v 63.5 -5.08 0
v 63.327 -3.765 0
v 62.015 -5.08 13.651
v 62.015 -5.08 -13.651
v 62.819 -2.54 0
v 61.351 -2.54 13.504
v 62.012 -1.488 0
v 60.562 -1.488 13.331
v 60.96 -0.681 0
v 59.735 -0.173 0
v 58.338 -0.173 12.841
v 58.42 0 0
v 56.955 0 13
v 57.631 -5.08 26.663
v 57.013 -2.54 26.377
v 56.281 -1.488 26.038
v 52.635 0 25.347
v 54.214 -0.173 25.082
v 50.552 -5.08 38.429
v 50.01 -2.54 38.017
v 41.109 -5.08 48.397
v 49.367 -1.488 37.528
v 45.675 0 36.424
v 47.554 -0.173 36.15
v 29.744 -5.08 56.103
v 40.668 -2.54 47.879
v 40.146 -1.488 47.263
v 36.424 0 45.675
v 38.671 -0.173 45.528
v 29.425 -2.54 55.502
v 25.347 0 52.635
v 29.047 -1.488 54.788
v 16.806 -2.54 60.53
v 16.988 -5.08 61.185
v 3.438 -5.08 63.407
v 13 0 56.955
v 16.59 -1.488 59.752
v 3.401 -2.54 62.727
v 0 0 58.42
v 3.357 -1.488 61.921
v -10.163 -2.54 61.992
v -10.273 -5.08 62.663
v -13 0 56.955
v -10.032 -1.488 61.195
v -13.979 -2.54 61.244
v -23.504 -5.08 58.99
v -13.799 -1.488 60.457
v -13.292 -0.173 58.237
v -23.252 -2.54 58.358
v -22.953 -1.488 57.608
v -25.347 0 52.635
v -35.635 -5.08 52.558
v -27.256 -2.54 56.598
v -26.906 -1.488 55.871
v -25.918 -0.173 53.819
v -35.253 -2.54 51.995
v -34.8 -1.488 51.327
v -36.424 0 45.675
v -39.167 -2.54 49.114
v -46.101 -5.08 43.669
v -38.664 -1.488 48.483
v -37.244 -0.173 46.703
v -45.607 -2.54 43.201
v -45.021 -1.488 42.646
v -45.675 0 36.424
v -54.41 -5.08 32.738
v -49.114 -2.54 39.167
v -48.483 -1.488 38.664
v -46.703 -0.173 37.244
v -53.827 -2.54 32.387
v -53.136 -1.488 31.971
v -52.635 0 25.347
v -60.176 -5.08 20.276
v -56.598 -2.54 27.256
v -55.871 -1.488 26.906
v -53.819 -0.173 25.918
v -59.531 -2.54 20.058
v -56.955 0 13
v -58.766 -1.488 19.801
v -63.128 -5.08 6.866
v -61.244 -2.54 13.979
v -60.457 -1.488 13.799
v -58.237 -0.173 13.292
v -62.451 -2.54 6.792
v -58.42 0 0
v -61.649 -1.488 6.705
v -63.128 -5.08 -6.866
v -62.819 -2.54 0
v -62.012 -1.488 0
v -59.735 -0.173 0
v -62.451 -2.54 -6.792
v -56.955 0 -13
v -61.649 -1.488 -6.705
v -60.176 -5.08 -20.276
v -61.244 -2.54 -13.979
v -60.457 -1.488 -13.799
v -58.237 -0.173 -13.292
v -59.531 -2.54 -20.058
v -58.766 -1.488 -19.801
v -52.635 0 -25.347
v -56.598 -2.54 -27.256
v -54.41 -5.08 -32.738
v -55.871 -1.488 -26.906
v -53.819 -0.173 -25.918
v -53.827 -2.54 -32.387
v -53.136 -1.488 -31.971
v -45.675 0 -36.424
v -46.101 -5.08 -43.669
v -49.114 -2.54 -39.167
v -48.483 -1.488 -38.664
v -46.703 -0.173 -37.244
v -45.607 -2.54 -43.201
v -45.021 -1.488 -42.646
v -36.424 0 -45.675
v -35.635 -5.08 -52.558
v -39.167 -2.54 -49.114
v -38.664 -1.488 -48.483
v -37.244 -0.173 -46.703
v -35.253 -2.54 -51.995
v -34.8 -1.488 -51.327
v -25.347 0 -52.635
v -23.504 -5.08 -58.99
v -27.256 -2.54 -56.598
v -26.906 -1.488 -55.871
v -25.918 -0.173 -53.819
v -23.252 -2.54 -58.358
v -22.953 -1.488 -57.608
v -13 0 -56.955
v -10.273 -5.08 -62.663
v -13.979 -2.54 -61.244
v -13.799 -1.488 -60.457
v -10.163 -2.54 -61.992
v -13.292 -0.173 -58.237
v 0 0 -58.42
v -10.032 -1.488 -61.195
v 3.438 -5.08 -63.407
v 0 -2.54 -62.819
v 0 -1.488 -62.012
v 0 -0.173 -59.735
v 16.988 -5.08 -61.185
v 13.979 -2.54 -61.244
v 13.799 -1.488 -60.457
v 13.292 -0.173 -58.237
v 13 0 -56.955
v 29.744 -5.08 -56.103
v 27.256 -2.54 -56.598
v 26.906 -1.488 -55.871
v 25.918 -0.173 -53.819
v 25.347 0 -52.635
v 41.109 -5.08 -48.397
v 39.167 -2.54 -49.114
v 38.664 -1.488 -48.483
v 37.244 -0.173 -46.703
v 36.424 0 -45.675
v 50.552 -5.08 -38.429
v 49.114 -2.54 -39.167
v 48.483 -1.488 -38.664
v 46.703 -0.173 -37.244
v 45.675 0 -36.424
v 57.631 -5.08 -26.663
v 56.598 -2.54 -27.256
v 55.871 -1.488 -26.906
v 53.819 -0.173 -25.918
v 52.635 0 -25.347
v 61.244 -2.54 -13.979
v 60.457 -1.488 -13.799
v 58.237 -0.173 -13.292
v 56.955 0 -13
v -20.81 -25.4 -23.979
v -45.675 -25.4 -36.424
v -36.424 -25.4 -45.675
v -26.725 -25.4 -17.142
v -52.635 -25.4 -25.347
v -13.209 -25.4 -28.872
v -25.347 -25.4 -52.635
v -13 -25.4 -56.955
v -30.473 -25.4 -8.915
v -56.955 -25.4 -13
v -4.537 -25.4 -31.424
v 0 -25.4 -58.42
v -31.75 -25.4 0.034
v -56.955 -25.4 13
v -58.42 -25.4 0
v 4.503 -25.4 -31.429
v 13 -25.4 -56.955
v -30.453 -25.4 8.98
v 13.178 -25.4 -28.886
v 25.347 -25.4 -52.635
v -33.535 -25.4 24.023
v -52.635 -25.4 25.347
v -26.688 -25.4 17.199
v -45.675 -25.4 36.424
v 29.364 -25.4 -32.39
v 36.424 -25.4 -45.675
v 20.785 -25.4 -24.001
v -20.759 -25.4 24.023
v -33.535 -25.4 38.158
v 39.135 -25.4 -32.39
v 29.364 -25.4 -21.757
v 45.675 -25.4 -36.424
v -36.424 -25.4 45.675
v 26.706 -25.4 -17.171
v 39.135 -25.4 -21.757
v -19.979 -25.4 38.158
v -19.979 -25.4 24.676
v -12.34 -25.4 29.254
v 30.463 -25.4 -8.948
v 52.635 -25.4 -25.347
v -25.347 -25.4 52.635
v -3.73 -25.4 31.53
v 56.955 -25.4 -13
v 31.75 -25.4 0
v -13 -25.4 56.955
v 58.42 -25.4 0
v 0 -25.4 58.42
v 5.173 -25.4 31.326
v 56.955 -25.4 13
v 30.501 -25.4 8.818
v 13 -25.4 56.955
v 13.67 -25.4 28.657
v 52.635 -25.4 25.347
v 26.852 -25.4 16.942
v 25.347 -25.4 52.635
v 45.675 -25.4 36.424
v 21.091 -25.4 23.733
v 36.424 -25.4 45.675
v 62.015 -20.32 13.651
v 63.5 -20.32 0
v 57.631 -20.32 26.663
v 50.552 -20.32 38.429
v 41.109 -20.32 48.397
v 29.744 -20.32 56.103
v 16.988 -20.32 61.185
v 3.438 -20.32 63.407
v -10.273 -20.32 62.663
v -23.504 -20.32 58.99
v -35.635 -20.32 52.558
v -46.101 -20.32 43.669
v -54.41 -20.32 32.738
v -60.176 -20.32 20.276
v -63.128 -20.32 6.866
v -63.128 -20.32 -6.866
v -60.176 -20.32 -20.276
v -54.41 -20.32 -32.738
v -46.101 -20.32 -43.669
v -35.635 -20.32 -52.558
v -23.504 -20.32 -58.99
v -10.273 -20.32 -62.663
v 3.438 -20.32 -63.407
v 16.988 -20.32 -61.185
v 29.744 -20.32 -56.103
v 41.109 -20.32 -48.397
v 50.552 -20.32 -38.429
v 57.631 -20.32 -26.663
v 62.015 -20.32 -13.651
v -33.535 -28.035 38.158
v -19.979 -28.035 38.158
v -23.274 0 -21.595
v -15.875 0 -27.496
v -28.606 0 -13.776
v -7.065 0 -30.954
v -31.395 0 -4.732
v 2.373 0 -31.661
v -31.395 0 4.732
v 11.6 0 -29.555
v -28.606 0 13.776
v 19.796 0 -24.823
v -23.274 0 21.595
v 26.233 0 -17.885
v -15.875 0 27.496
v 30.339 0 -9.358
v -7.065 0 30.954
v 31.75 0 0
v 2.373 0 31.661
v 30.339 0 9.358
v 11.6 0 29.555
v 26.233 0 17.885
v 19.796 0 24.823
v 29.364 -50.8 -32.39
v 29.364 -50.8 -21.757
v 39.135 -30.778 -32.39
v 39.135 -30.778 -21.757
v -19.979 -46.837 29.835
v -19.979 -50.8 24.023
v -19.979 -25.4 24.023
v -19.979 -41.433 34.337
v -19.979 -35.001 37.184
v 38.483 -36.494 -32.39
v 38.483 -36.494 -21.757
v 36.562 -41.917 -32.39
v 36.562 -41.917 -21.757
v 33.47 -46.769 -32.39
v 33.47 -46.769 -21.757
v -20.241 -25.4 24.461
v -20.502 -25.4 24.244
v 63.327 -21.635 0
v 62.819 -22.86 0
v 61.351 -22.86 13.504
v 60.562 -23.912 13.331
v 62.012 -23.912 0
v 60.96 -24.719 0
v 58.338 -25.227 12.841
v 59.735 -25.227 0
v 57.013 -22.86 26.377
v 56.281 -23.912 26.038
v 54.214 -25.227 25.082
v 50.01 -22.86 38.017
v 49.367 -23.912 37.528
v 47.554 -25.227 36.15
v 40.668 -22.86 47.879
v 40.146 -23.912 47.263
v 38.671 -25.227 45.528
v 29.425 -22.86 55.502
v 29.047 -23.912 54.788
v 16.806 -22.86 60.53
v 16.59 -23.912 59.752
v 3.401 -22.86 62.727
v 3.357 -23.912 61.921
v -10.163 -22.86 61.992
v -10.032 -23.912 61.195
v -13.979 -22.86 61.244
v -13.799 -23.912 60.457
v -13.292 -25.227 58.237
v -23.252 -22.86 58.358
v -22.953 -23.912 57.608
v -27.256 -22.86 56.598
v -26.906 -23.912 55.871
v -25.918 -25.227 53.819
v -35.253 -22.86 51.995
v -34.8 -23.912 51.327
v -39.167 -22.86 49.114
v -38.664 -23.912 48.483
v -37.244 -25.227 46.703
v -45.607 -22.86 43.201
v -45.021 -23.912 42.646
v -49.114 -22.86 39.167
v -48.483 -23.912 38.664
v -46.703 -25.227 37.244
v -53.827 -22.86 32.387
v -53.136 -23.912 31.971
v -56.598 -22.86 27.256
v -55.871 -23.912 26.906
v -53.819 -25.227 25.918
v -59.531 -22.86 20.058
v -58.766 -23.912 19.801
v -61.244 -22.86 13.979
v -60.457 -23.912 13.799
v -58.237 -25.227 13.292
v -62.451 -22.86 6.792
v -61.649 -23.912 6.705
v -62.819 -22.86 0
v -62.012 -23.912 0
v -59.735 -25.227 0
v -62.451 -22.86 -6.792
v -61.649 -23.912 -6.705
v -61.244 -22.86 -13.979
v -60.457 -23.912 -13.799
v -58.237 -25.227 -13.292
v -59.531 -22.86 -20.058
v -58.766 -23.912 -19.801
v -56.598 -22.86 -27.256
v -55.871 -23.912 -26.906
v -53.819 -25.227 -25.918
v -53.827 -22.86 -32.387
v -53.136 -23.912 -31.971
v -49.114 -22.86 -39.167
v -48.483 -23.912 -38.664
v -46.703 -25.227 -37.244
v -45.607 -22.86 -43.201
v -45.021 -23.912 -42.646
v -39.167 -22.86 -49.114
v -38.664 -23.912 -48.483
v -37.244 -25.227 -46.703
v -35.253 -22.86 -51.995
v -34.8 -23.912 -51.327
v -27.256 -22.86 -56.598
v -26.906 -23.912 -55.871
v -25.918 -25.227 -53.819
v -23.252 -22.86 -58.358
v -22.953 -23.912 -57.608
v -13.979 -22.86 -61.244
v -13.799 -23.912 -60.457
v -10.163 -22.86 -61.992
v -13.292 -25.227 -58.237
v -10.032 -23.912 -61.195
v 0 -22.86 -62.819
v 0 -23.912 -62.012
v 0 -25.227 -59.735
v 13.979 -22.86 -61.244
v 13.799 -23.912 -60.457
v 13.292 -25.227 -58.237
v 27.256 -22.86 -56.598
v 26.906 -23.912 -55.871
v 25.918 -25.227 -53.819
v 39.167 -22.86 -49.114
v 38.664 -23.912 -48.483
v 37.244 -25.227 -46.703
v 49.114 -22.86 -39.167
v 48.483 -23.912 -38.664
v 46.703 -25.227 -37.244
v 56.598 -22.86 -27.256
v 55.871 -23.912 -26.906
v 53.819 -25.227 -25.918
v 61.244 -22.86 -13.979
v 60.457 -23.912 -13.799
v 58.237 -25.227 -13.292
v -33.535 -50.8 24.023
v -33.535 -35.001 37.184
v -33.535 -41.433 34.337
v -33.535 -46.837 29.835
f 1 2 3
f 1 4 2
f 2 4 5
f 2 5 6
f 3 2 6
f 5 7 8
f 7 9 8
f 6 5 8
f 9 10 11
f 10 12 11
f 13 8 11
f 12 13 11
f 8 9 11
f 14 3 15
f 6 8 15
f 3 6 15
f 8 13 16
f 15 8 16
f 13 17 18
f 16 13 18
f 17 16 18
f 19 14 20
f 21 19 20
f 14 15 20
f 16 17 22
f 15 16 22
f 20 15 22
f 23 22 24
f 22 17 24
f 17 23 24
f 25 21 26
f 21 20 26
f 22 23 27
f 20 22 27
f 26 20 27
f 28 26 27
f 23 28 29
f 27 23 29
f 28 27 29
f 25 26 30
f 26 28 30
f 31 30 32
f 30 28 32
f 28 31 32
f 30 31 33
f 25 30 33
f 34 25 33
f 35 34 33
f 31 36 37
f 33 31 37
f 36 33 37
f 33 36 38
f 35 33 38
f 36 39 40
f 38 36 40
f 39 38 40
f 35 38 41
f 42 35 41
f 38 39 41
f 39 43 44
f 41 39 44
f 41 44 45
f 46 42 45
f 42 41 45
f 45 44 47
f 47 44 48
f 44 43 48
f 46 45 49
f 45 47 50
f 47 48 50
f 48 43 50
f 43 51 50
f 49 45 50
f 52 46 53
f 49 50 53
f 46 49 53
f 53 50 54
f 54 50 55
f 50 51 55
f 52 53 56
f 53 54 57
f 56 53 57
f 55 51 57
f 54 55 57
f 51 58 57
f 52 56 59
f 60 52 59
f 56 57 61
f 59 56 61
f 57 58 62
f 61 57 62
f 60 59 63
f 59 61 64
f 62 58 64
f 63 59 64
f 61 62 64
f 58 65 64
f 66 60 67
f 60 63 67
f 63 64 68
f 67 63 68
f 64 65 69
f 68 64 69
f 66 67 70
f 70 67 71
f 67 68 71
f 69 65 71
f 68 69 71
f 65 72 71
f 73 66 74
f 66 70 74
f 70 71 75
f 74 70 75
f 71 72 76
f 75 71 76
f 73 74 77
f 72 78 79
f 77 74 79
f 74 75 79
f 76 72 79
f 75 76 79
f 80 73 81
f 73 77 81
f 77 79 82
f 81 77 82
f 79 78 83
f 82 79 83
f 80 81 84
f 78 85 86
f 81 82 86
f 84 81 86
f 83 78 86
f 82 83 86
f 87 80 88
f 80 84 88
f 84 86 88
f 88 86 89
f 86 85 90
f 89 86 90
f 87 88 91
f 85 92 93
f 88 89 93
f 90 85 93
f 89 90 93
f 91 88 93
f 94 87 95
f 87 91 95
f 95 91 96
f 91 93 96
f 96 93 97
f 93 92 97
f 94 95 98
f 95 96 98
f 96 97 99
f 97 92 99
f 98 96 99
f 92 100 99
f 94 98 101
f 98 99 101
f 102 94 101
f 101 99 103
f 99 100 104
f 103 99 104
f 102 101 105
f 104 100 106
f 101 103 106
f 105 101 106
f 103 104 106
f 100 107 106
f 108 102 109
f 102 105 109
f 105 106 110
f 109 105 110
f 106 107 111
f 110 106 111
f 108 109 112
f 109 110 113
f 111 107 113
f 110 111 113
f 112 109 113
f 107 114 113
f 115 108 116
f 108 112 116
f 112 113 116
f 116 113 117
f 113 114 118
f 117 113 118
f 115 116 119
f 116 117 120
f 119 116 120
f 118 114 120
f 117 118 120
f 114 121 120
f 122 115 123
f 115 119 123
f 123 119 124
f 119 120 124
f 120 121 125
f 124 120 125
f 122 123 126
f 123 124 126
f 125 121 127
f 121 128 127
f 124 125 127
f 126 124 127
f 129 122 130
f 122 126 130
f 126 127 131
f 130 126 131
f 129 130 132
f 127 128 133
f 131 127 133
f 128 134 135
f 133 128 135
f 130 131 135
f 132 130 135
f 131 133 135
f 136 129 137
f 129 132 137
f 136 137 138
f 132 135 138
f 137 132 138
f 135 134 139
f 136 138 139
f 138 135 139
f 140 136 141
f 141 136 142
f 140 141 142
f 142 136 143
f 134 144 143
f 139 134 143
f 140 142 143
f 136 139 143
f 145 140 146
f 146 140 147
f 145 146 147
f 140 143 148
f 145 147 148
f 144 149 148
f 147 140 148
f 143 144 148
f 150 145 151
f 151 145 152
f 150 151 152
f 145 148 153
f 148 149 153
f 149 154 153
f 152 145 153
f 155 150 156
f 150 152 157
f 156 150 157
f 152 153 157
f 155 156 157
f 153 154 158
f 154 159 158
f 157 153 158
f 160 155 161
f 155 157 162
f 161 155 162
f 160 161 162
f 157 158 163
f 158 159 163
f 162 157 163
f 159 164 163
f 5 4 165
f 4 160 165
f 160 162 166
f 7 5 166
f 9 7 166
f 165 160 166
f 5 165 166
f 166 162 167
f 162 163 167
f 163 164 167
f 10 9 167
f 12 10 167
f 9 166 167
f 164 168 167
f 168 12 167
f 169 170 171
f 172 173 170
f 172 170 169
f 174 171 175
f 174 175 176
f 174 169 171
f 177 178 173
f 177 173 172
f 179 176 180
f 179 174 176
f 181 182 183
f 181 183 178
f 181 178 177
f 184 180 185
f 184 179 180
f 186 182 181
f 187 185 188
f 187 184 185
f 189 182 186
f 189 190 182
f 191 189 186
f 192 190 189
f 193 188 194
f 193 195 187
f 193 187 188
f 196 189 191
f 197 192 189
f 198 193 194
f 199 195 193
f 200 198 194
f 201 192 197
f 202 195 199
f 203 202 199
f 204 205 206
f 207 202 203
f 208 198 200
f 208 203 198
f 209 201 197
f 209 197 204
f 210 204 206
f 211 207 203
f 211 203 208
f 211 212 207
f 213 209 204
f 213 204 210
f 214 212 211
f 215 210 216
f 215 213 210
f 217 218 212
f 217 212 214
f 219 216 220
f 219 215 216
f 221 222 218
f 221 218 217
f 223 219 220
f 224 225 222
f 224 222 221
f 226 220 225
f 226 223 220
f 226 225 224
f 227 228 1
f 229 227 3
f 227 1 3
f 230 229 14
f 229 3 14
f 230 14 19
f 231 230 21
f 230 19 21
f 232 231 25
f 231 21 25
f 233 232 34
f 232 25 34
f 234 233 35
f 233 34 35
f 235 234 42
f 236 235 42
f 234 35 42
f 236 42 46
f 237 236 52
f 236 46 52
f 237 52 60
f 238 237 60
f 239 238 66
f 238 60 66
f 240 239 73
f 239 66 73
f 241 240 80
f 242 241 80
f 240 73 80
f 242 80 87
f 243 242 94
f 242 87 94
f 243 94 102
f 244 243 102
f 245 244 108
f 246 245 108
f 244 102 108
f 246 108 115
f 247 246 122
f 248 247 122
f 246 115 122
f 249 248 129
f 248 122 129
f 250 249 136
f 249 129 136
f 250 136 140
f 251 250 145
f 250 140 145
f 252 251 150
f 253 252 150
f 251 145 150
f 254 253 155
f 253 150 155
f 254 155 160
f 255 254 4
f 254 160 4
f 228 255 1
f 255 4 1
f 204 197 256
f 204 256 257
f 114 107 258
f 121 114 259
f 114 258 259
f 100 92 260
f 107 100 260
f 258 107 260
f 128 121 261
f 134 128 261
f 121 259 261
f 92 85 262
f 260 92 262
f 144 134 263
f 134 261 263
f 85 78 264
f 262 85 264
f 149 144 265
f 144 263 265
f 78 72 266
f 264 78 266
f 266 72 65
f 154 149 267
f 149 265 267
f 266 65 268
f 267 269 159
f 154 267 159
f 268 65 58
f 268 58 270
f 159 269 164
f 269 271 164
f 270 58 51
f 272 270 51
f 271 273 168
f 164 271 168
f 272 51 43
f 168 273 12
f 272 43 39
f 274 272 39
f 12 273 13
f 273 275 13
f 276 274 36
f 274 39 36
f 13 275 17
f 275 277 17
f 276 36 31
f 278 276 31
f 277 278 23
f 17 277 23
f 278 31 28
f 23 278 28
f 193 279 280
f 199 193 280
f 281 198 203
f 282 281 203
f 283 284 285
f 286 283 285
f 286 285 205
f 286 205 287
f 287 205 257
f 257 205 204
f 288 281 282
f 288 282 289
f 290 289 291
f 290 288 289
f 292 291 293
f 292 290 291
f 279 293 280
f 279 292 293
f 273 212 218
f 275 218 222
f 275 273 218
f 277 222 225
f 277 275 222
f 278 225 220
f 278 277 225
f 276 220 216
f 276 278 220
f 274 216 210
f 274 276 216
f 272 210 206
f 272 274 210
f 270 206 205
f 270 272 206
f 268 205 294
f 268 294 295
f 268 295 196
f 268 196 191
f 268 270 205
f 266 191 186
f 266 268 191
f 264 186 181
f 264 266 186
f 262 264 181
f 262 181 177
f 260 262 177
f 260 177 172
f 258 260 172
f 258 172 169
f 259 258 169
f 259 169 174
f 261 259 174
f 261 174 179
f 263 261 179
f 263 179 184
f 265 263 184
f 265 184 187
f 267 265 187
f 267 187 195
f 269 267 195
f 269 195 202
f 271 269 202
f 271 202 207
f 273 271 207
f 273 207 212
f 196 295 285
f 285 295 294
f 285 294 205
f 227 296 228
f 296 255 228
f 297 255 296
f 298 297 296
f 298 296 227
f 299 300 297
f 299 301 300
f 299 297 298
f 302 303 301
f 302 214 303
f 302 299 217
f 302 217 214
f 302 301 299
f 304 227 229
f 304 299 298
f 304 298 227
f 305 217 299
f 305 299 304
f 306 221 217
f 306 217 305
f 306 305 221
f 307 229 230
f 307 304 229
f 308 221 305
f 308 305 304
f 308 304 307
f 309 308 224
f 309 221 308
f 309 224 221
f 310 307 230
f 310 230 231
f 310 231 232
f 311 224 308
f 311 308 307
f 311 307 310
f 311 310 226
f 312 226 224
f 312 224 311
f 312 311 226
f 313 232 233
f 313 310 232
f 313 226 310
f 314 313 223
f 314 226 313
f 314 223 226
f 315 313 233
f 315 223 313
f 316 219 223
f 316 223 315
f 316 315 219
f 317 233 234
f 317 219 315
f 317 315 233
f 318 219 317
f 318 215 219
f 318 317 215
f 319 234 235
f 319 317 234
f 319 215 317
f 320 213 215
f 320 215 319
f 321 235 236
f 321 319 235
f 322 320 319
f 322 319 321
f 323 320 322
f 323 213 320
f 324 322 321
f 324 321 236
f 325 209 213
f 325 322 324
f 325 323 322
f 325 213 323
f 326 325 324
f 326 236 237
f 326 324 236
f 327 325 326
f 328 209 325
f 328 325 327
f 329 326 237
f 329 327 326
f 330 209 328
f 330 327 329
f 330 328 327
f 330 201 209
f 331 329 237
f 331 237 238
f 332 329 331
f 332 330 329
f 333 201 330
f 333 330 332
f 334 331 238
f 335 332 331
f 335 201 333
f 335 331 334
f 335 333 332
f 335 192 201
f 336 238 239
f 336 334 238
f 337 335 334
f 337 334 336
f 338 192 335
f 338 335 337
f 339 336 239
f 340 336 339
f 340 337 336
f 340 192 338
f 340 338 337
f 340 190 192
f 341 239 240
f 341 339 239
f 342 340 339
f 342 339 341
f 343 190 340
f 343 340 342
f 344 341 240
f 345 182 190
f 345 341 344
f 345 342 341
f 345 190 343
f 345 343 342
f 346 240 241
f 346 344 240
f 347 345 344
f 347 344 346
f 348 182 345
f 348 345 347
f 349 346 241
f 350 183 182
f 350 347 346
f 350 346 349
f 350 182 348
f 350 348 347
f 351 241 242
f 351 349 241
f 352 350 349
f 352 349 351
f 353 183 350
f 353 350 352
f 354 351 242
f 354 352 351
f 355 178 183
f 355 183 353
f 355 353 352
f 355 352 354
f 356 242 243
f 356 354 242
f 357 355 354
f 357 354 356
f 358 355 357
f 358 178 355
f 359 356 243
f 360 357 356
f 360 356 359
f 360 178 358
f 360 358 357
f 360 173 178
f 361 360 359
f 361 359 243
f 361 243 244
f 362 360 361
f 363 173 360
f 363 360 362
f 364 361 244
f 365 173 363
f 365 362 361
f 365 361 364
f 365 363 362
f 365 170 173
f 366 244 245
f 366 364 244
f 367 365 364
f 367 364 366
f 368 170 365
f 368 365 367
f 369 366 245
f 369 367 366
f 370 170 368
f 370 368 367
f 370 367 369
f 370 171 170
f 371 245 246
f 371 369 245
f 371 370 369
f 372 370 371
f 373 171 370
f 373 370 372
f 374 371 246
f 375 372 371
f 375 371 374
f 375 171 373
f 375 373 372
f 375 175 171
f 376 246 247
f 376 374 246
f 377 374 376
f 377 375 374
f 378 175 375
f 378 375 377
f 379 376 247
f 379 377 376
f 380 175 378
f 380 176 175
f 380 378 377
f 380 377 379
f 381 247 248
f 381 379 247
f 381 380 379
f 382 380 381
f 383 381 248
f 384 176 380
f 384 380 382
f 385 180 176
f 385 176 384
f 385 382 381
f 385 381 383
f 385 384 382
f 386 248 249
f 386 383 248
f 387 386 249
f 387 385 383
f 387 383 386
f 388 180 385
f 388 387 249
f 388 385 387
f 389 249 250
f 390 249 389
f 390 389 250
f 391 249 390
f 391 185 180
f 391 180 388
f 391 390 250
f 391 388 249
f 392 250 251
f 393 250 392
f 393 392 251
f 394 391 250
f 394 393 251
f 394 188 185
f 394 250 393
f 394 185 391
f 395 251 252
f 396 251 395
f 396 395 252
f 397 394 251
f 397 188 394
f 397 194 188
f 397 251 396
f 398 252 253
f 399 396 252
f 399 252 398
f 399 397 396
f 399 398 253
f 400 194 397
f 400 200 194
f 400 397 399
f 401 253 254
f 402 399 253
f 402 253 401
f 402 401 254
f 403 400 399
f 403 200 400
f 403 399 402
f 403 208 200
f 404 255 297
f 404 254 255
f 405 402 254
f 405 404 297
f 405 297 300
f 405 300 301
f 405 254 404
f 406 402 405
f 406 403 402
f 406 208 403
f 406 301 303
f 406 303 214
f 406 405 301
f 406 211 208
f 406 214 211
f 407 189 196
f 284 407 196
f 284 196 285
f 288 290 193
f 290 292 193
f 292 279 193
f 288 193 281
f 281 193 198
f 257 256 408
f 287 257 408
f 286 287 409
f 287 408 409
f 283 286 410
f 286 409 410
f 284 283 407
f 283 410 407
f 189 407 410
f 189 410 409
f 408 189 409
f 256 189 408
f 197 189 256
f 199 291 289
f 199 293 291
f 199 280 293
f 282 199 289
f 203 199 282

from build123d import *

# Parameters (mm, degrees)
F0_R        = 63.5
F0_R_2      = 31.75
F1_DEPTH    = 25.4
F2_R        = 5.08
F3_R        = 5.08
F6_W        = 9.770580698
F6_H        = 10.6324088763
F6_W_2      = 13.55634837
F6_H_2      = 14.134524271
F7_DEPTH    = 25.4
F8_T1_DEPTH = 127.3817691468
F9_T1_DEPTH = 110.742504806


# Not quite as in the source:
# - a fillet or chamfer that OpenCascade refuses, or shapes differently, is made with other operations: its cross-section is extruded or revolved along the edge and cut away or added
# - the program builds the solid bodies; features that only make, move or delete a surface that nothing else refers to are left out


with BuildPart() as f1:
    # F0 (on Front) → F1 (new body)
    with BuildSketch(Plane.XZ):
        Circle(F0_R)
        Circle(F0_R_2, mode=Mode.SUBTRACT)
    extrude(amount=F1_DEPTH)

    # F2
    f2_edges = [f1.edges().sort_by_distance(p)[0] for p in [
        (-63.5, -25.4, 0),
    ]]
    fillet(f2_edges, radius=F2_R)

    # F3
    f3_edges = [f1.edges().sort_by_distance(p)[0] for p in [
        (-63.5, 0, 0),
    ]]
    fillet(f3_edges, radius=F3_R)

    # F6 (on face) → F7 (join)
    with BuildSketch(Plane.XZ.offset(25.4)):
        with Locations((34.2497480866, -27.0734353661)):
            Rectangle(F6_W, F6_H)
        with Locations((-26.7572421814, 31.0905136006)):
            Rectangle(F6_W_2, F6_H_2)
    extrude(amount=F7_DEPTH)

    # F8: fillet of radius 25.4 on 1 edges, made by hand

    # F8_s2 → F8_t1 (cut)
    with BuildSketch(Plane.YZ.offset(-90.4481267548)):
        with BuildLine():
            ThreePointArc((-28.0349158446, 38.1577757361), (-41.4329925067, 34.3367363635), (-50.8, 24.0232514651))
            Line((-50.8, 24.0232514651), (-50.8, 38.1577757361))
            Line((-50.8, 38.1577757361), (-28.0349158446, 38.1577757361))
        make_face()
    extrude(amount=F8_T1_DEPTH, mode=Mode.SUBTRACT)

    # F9: fillet of radius 25.4 on 1 edges, made by hand

    # F9_s2 → F9_t1 (cut)
    with BuildSketch(Plane.XY.offset(-82.4446877691)):
        with BuildLine():
            ThreePointArc((39.1350384356, -30.777980814), (36.5620755875, -41.9173872105), (29.3644577376, -50.8))
            Line((29.3644577376, -50.8), (39.1350384356, -50.8))
            Line((39.1350384356, -50.8), (39.1350384356, -30.777980814))
        make_face()
    extrude(amount=F9_T1_DEPTH, mode=Mode.SUBTRACT)


solid = f1.part
